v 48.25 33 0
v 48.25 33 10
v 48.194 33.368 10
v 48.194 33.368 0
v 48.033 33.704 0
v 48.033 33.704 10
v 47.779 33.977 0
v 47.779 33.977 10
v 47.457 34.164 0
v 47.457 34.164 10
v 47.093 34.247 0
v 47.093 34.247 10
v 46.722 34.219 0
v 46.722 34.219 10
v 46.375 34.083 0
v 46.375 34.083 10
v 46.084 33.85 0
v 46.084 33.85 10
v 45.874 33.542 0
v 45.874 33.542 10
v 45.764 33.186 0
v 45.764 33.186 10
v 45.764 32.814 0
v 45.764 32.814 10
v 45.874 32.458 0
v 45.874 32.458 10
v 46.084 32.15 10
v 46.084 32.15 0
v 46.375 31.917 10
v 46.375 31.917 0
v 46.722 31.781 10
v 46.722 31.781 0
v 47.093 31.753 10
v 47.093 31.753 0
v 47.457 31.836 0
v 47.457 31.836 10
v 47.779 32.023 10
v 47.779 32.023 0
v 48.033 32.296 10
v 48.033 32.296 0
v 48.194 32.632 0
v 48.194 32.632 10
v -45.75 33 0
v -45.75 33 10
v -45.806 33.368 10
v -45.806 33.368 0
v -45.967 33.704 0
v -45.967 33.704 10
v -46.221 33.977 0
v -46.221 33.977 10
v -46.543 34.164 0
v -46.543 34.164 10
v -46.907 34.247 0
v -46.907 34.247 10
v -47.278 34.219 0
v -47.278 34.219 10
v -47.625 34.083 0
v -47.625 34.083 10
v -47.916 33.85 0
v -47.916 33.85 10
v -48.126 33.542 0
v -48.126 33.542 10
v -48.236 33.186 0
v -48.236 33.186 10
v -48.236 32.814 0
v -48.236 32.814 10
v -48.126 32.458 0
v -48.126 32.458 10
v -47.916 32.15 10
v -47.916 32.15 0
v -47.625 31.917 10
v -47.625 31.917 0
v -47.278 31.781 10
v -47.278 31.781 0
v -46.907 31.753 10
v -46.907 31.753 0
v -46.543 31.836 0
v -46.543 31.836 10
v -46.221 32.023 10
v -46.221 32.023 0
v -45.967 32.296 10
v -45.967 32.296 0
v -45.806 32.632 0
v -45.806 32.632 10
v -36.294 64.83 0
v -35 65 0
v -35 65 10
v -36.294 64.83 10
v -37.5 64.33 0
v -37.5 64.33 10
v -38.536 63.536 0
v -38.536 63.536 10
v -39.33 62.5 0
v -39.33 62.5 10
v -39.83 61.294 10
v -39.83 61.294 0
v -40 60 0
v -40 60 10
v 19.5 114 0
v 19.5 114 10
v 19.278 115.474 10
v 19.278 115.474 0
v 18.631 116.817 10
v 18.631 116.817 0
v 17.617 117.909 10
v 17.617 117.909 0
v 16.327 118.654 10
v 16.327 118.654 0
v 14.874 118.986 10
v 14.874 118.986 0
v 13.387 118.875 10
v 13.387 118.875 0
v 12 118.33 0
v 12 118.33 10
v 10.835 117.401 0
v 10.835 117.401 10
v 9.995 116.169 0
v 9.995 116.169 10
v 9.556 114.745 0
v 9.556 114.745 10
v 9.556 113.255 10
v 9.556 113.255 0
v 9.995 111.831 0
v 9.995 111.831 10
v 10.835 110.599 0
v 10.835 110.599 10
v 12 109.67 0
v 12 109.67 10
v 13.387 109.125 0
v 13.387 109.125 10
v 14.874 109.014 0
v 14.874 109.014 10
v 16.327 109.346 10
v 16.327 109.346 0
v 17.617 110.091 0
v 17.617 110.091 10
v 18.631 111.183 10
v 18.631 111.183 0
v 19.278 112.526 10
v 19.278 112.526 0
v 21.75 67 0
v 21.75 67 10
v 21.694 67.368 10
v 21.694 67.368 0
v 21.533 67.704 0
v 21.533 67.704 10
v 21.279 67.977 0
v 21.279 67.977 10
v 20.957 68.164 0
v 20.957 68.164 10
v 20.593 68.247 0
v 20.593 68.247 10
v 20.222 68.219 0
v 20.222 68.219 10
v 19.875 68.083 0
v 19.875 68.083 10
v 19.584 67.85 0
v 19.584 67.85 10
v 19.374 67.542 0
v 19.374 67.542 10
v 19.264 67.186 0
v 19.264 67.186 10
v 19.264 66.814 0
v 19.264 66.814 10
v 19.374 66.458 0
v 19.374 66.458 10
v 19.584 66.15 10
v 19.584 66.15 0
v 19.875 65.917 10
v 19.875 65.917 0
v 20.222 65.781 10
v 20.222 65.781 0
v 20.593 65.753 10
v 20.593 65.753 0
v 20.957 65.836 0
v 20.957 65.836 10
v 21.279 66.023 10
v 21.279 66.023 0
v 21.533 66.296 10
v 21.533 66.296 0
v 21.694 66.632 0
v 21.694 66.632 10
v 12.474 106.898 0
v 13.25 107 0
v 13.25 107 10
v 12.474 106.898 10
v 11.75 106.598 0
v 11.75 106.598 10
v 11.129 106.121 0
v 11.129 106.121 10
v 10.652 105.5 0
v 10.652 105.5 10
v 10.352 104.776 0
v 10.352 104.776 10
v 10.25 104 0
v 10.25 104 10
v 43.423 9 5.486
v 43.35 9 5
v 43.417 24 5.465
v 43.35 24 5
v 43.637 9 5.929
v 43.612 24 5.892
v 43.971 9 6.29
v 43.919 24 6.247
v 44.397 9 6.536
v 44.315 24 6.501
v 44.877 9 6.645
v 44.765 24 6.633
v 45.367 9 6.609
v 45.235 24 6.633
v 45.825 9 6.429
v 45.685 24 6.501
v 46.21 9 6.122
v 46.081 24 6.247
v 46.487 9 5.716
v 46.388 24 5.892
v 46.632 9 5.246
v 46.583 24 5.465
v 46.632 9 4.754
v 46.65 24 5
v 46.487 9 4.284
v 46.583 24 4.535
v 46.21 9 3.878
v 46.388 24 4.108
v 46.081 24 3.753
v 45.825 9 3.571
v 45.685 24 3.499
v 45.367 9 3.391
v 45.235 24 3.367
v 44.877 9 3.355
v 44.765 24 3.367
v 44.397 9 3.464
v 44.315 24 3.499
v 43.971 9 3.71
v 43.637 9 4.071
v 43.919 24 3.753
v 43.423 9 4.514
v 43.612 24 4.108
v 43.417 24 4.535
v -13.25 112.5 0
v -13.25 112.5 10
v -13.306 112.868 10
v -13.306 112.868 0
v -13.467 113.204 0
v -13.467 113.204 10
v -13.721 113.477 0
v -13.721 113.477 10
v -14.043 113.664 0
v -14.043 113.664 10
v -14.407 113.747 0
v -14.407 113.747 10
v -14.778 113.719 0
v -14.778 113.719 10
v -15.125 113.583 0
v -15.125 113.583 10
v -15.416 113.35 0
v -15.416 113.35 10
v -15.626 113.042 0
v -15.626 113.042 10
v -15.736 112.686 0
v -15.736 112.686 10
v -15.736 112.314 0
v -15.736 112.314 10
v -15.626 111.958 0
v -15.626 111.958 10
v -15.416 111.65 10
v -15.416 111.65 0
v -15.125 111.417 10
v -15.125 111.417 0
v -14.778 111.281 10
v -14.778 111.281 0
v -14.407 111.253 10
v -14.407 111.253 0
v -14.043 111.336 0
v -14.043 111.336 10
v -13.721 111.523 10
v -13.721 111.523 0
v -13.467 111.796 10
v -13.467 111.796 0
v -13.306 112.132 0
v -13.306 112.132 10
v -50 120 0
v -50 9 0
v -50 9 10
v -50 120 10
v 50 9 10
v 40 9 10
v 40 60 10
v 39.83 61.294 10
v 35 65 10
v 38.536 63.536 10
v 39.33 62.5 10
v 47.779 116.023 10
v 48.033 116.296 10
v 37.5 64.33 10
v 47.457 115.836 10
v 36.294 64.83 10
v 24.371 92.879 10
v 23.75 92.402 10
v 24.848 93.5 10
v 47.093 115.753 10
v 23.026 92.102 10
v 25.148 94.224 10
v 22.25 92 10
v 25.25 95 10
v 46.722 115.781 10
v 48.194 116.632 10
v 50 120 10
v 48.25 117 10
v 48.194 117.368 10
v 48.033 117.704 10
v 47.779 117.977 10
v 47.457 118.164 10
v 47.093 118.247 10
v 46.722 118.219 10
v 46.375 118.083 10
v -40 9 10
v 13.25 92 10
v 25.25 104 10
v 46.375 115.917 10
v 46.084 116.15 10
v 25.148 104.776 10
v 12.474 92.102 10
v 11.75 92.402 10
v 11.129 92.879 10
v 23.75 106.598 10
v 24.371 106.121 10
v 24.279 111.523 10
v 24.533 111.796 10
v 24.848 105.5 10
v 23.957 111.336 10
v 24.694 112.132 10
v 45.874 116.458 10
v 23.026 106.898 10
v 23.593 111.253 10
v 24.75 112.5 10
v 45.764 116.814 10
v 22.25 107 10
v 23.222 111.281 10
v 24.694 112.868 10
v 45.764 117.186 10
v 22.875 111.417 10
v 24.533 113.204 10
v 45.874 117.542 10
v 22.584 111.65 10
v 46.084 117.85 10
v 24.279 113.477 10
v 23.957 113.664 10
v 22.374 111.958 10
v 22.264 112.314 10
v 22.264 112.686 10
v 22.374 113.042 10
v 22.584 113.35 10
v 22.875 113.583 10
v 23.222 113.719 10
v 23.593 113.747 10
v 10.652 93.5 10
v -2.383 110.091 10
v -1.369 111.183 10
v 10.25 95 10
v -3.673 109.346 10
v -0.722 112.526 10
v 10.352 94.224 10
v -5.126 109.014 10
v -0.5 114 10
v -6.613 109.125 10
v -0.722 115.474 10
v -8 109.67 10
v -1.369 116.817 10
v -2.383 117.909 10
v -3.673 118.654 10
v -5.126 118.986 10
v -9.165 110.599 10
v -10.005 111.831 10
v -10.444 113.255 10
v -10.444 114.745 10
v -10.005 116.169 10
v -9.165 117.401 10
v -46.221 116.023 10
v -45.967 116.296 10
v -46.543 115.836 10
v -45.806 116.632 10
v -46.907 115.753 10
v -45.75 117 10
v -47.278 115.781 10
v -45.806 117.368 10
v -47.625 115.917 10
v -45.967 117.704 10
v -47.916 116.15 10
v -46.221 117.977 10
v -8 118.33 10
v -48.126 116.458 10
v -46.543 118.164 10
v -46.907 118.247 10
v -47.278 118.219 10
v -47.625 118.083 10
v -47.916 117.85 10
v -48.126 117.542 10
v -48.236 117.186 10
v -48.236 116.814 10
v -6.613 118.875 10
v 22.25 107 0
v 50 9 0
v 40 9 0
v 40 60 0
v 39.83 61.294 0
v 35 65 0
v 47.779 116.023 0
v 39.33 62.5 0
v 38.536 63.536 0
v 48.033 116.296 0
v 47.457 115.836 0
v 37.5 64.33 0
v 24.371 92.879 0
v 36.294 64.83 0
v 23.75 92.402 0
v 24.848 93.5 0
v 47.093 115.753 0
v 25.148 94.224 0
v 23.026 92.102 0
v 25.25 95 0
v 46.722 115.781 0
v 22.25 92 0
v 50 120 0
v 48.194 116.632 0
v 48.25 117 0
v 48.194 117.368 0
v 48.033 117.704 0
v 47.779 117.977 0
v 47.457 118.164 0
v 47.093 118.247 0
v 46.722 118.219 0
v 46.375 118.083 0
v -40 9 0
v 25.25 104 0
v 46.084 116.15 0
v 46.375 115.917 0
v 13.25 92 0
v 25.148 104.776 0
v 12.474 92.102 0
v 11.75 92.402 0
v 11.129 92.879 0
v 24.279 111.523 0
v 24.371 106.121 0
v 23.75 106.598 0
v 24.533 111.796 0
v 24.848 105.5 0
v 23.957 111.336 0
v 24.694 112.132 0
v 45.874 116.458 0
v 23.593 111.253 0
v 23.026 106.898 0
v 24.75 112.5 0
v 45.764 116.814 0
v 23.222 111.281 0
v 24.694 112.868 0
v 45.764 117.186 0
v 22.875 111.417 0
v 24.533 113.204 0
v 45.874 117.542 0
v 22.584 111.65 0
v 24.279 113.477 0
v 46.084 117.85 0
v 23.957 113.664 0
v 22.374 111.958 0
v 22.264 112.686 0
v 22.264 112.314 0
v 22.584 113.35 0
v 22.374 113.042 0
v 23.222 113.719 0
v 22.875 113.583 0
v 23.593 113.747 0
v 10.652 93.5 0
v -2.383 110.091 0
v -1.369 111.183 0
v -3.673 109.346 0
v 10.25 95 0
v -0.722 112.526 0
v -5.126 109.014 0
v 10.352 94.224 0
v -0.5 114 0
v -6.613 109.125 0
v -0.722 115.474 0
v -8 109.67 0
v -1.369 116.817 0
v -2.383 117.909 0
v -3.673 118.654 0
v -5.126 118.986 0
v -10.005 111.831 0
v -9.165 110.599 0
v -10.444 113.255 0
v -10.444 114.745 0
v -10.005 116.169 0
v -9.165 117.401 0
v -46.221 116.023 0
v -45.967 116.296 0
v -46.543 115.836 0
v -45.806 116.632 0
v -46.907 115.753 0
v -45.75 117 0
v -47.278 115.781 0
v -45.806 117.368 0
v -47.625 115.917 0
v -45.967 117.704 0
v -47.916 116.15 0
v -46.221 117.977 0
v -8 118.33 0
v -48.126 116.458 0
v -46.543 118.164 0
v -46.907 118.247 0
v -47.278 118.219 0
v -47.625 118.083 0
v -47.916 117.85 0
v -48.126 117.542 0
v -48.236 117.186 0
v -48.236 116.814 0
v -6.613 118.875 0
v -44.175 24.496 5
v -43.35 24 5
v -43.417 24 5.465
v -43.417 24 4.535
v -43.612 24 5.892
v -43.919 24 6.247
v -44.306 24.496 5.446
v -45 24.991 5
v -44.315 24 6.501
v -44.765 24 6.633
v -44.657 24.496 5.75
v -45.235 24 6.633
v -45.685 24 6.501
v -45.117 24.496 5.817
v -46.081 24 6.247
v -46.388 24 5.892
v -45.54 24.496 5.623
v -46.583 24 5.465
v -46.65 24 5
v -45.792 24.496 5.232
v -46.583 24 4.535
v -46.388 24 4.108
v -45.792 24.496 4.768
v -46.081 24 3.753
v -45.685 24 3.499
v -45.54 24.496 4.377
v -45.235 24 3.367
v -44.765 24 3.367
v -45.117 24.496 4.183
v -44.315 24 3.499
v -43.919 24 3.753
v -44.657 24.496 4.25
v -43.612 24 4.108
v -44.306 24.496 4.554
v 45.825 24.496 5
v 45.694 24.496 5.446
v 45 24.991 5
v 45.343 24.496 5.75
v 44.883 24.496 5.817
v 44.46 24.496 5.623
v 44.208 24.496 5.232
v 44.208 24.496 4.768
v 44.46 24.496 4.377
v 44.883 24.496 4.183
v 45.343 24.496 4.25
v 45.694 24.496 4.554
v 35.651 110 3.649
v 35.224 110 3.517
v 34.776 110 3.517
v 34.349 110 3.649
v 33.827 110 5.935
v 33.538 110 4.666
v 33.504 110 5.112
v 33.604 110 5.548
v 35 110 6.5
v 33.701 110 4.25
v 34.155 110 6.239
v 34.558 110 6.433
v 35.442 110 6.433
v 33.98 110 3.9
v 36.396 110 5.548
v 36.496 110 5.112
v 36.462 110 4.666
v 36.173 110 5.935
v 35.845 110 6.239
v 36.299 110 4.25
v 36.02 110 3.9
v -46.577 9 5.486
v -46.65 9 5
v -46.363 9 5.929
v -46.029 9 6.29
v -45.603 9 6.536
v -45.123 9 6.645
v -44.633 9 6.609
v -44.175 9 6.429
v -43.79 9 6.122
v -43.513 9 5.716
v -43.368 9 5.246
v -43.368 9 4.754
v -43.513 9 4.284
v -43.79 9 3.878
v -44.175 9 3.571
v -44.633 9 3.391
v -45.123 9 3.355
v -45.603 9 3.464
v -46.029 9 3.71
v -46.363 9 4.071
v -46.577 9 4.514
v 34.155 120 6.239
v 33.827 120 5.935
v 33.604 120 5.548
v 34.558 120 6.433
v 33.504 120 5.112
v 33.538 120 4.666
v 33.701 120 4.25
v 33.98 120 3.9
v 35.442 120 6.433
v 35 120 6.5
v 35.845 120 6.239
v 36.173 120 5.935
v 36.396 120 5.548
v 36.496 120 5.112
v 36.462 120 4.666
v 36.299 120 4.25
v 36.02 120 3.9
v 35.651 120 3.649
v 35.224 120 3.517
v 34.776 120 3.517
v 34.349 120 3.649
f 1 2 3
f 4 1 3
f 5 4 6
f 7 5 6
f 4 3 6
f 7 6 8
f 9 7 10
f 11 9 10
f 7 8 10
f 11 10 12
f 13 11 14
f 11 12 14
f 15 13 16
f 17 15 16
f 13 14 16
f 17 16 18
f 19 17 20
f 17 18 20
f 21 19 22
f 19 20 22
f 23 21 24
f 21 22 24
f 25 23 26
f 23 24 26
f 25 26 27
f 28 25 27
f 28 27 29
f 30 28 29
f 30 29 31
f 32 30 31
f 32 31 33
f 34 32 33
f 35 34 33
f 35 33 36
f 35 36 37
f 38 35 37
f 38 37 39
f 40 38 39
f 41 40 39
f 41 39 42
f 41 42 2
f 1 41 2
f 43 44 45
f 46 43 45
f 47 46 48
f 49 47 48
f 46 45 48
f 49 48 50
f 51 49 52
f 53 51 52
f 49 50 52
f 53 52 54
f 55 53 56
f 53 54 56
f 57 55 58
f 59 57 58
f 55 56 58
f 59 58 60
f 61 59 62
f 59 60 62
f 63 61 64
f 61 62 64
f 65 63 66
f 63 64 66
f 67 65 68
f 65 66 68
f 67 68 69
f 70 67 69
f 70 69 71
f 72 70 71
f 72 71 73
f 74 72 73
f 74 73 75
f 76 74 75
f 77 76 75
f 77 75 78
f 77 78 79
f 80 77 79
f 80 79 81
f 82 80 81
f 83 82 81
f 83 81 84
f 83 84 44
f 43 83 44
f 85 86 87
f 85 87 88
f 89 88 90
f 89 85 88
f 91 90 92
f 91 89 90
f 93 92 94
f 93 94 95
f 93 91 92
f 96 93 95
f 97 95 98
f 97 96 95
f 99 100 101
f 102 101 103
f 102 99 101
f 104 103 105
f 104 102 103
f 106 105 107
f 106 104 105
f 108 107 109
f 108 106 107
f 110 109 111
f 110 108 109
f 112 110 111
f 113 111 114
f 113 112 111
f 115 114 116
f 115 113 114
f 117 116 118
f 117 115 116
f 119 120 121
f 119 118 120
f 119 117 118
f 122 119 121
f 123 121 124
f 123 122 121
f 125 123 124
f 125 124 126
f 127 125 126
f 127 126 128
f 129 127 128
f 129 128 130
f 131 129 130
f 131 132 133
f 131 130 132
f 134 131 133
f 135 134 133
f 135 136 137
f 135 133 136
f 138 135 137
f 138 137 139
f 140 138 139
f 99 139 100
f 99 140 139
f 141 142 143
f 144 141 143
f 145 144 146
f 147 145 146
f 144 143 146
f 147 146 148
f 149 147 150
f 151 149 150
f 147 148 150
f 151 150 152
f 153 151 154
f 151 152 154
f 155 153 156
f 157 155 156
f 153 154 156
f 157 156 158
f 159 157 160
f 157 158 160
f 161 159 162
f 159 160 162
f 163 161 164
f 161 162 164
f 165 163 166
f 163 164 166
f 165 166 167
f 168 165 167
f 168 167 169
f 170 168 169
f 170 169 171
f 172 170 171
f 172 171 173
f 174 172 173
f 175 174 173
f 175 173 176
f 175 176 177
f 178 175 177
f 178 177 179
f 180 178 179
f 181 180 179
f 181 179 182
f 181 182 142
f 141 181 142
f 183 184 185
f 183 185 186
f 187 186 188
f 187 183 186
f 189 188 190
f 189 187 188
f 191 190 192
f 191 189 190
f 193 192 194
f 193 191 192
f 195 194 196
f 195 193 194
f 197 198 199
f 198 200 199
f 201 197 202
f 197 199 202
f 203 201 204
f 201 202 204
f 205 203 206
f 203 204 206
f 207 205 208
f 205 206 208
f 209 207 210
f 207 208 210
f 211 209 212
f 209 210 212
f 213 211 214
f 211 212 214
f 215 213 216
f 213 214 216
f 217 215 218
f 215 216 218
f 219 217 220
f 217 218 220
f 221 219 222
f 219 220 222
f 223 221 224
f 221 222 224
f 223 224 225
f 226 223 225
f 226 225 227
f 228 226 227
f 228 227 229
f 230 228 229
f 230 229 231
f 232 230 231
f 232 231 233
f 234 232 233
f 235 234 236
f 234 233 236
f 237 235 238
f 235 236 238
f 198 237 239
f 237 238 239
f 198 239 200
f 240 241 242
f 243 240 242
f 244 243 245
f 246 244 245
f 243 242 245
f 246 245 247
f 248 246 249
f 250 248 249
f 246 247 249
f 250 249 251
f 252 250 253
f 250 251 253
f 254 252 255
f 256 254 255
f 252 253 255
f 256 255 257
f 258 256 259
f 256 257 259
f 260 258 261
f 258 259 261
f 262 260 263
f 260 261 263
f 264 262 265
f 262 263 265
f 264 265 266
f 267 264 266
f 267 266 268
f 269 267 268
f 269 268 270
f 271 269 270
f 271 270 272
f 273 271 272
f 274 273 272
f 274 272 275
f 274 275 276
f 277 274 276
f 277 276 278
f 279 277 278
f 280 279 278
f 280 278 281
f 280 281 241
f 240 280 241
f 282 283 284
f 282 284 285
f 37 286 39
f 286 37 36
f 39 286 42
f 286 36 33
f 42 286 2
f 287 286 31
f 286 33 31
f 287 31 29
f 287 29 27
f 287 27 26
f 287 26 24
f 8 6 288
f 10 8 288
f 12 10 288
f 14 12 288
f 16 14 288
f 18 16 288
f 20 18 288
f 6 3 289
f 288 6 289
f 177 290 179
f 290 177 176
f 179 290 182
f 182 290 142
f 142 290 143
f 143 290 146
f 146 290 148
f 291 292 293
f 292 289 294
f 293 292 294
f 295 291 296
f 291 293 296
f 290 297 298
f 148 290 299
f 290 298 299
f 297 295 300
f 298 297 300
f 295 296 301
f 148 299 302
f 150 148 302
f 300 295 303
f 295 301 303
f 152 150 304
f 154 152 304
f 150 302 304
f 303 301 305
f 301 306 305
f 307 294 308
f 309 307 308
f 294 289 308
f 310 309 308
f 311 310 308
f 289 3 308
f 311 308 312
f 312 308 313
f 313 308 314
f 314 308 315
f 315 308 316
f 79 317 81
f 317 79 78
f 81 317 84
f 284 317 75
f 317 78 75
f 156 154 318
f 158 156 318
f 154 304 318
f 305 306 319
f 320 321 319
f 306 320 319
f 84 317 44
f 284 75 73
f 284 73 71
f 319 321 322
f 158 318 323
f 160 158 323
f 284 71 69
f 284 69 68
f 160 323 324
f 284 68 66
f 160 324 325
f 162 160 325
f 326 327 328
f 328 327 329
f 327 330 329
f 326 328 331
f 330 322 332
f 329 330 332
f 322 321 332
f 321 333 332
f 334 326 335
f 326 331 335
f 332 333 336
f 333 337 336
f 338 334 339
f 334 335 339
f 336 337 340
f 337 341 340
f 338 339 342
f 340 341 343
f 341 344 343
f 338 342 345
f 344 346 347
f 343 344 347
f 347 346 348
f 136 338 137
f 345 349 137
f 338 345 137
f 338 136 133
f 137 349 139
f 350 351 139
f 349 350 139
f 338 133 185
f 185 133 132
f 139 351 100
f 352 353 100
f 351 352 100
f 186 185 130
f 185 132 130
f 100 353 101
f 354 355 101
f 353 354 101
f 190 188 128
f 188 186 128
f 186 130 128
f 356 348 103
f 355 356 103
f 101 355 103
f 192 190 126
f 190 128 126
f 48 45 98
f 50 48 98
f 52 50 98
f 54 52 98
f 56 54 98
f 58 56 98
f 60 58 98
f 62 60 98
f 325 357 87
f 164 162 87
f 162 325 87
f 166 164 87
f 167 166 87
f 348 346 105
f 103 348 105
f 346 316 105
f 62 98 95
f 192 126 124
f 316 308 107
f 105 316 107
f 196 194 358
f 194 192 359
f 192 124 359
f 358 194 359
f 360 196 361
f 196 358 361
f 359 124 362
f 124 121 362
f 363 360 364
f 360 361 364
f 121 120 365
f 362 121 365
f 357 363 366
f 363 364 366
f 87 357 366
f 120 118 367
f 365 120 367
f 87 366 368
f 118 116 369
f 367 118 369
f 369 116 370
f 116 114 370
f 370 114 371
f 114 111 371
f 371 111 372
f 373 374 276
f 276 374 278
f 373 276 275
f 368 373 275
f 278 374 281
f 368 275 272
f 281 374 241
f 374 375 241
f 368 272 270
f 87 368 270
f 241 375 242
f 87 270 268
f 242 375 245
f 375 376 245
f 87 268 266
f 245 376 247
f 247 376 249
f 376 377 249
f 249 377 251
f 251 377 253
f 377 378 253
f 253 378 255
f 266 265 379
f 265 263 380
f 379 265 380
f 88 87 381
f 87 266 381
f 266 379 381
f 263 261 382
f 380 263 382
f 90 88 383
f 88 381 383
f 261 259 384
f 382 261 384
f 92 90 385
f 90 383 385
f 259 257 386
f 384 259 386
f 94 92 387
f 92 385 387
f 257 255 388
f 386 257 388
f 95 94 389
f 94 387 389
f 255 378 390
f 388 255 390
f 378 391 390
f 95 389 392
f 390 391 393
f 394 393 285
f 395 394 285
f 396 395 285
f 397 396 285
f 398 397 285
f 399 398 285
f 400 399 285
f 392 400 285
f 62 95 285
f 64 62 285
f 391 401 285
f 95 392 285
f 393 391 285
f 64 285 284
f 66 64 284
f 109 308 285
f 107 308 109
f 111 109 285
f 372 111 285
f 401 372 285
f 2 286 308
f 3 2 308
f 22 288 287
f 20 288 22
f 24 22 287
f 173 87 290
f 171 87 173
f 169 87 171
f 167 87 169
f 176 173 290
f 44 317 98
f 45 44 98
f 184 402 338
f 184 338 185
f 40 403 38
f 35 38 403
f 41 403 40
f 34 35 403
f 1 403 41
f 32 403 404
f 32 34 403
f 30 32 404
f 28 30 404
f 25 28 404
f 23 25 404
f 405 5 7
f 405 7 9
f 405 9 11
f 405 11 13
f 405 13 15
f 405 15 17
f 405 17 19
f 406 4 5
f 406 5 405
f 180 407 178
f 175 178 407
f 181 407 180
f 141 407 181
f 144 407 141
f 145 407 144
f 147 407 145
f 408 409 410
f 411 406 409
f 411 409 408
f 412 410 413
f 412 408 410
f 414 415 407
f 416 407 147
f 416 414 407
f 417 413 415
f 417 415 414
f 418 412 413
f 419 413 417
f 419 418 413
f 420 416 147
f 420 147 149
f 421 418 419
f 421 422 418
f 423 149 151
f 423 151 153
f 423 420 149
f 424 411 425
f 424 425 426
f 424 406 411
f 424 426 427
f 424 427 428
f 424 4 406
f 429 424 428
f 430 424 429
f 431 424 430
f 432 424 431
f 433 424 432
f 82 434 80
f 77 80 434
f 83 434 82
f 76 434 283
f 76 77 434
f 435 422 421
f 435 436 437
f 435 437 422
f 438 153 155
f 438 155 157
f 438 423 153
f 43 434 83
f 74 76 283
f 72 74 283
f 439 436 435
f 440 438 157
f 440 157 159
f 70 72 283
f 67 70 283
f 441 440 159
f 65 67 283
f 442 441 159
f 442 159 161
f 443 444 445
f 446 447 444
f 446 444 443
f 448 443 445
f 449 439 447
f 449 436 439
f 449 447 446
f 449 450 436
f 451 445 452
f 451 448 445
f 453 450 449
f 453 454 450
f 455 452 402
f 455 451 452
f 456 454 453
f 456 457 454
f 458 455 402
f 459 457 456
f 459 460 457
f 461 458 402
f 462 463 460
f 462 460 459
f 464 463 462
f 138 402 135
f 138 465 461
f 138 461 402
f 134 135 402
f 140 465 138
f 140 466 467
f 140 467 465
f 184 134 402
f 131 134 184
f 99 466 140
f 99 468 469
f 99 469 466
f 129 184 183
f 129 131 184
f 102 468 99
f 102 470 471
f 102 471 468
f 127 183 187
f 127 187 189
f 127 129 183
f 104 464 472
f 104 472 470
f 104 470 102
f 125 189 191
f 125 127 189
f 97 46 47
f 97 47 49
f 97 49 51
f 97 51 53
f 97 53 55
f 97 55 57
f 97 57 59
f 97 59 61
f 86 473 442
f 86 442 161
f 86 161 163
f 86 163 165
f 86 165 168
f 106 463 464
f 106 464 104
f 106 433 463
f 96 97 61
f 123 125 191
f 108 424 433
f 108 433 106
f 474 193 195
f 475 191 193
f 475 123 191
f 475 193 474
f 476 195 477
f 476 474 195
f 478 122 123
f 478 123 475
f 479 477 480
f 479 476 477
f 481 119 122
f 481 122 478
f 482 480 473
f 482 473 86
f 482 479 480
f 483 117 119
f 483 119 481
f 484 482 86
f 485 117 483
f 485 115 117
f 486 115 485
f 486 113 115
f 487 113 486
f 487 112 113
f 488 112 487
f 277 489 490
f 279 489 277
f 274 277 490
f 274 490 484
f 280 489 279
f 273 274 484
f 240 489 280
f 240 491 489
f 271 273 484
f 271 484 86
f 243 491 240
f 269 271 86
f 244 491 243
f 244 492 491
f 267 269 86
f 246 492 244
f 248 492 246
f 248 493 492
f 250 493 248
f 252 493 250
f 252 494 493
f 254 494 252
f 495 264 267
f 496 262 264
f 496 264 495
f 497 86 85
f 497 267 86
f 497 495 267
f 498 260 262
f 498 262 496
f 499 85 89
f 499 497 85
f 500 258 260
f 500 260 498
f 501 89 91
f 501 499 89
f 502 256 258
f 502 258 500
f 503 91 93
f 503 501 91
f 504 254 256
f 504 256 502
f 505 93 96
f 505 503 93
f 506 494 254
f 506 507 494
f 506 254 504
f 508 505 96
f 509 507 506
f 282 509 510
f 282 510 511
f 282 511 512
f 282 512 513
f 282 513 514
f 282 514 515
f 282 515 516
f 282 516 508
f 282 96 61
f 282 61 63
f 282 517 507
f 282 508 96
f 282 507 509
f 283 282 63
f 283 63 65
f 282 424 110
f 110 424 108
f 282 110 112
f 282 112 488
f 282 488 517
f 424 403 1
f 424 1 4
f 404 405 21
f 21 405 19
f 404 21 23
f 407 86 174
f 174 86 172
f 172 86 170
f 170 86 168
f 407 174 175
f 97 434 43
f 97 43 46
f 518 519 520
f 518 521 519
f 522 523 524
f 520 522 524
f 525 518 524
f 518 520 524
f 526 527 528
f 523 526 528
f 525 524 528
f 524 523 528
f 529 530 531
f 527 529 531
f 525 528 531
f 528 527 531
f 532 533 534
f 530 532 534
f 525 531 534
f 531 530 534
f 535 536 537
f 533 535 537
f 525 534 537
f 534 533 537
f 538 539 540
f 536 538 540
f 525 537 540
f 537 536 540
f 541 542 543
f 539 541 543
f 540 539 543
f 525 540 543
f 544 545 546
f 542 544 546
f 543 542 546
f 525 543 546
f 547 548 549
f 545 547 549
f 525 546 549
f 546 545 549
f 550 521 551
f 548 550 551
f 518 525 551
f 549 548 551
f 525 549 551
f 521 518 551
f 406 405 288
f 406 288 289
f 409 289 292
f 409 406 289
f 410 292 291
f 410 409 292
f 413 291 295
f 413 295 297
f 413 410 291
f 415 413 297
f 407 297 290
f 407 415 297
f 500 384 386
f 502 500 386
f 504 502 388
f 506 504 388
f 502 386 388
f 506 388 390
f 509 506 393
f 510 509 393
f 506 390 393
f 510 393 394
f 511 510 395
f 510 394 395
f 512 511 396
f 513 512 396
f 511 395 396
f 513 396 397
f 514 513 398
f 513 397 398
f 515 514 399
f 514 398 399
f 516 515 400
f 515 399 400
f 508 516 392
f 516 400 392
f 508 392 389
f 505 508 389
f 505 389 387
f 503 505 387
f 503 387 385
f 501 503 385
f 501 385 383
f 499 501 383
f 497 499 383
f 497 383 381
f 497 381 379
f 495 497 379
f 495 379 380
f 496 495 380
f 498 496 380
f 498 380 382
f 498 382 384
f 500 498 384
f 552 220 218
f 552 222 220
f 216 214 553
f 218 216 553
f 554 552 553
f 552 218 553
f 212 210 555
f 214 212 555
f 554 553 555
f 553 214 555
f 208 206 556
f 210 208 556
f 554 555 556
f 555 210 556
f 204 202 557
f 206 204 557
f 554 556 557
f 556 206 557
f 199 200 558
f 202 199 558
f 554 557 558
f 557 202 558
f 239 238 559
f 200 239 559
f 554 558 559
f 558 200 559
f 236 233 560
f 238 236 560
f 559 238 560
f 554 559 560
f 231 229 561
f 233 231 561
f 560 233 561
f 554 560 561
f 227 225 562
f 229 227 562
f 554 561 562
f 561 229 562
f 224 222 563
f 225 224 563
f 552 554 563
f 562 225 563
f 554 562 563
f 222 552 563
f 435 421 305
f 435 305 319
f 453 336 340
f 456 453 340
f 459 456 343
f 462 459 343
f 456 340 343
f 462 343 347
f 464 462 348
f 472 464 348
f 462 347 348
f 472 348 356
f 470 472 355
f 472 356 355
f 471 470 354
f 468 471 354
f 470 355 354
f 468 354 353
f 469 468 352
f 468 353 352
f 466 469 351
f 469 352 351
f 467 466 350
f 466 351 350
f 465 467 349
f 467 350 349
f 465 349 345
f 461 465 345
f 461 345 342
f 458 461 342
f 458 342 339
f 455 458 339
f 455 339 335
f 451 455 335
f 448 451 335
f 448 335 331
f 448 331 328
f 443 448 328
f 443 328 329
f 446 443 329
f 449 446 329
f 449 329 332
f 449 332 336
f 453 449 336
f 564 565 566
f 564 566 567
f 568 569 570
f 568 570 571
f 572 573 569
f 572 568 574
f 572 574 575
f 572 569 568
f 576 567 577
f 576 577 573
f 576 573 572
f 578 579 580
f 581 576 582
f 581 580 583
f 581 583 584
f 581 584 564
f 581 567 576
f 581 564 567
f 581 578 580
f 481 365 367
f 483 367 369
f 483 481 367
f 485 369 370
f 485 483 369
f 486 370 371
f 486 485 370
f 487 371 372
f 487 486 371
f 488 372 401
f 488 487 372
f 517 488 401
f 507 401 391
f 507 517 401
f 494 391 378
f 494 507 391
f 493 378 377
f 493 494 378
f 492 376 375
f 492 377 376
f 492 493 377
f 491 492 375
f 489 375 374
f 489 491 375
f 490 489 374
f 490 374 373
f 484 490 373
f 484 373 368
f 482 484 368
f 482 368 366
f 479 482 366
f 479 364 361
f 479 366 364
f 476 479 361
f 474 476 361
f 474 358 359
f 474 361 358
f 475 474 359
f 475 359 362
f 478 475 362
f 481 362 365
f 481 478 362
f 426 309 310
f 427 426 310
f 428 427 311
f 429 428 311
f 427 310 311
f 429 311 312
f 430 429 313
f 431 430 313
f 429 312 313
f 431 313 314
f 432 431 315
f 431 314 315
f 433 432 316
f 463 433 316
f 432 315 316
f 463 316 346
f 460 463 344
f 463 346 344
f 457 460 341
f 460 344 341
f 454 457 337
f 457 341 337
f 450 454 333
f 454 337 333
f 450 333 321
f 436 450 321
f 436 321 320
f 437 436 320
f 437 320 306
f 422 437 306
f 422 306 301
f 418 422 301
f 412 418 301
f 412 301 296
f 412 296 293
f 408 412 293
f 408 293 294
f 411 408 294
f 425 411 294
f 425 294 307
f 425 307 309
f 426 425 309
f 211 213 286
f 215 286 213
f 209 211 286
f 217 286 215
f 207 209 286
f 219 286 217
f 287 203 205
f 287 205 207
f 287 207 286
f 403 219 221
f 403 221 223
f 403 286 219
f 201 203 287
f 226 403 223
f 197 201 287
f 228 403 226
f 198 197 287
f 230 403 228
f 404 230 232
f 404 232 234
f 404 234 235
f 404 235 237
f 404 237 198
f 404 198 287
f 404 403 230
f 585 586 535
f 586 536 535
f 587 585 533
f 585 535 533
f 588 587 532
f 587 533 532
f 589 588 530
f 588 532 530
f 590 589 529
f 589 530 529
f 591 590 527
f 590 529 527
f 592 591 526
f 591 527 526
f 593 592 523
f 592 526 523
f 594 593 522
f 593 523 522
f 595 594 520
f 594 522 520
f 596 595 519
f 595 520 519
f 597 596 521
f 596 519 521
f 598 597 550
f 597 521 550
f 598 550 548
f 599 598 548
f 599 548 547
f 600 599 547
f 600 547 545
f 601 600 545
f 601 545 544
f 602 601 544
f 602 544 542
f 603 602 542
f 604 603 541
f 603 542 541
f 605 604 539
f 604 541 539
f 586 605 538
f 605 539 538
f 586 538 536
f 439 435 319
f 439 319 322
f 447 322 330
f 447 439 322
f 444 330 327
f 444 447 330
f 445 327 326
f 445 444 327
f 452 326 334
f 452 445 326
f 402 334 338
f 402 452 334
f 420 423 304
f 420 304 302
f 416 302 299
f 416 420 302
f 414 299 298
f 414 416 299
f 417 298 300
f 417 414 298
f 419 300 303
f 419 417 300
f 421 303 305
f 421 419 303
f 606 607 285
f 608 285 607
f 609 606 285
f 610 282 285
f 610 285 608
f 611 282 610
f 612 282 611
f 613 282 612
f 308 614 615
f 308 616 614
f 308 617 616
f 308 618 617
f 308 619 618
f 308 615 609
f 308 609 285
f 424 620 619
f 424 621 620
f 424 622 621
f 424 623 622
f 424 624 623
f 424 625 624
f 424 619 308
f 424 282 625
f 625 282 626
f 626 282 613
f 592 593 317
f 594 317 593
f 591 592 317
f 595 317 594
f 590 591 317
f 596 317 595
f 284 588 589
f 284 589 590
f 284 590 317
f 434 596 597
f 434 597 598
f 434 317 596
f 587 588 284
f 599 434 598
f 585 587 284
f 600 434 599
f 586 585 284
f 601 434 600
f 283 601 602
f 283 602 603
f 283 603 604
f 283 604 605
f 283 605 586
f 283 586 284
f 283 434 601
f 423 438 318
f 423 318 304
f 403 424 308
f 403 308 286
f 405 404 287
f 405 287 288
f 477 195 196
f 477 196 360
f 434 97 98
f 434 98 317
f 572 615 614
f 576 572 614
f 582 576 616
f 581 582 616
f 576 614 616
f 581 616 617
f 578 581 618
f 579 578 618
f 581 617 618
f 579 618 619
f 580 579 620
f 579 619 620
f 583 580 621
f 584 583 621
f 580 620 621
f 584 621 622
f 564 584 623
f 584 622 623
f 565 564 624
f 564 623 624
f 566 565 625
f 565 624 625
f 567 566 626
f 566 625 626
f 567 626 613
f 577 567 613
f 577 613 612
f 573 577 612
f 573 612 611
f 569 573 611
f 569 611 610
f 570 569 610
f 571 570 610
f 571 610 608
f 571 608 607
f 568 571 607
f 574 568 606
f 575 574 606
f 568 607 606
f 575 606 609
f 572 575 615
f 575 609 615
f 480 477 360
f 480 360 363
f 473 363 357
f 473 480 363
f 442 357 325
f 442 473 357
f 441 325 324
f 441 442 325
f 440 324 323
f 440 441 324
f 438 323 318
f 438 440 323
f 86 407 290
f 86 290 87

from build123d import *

# Parameters (mm, degrees)
EXTRUSION1_DEPTH          = 10
TROU_TARAUD_M4X0_71_D     = 3.3
TROU_TARAUD_M4X0_71_DEPTH = 15
TROU_TARAUD_M4X0_71_TIP   = 0.991420021
ESQUISSE4_R               = 5
ENL_V_MAT_EXTRU_1_DEPTH   = 131.384048104
TROU_TARAUD_M31_D         = 2.5
ESQUISSE7_R               = 1.5
ENL_V_MAT_EXTRU_2_DEPTH   = 10


with BuildPart() as part:
    # Esquisse1 → Extrusion1 (new body)
    with BuildSketch(Plane.XY):
        with BuildLine():
            Line((-40, 9), (-50, 9))
            Line((-50, 9), (-50, 120))
            Line((-50, 120), (50, 120))
            Line((50, 120), (50, 9))
            Line((50, 9), (40, 9))
            Line((40, 9), (40, 60))
            ThreePointArc((40, 60), (38.535533906, 63.535533906), (35, 65))
            Line((35, 65), (-35, 65))
            ThreePointArc((-35, 65), (-38.535533906, 63.535533906), (-40, 60))
            Line((-40, 60), (-40, 9))
        make_face()
    extrude(amount=EXTRUSION1_DEPTH)

    # Trou taraudé M4x0.71
    with Locations(Plane.XZ.offset(-9)):
        with Locations((-45, 5), (45, 5)):
            Hole(TROU_TARAUD_M4X0_71_D / 2, depth=TROU_TARAUD_M4X0_71_DEPTH)
            with Locations((0, 0, -(TROU_TARAUD_M4X0_71_DEPTH + TROU_TARAUD_M4X0_71_TIP / 2))):  # 118° drill point
                Cone(0, TROU_TARAUD_M4X0_71_D / 2, TROU_TARAUD_M4X0_71_TIP, mode=Mode.SUBTRACT)

    # Esquisse4 → Enlèv. mat.-Extru.1 (cut, through all)
    with BuildSketch(Plane.XY):
        with Locations((14.5, 114)):
            Circle(ESQUISSE4_R)
        with Locations((-5.5, 114)):
            Circle(ESQUISSE4_R)
        with BuildLine():
            Line((22.25, 107), (13.25, 107))
            ThreePointArc((13.25, 107), (11.128679656, 106.121320344), (10.25, 104))
            Line((10.25, 104), (10.25, 95))
            ThreePointArc((10.25, 95), (11.128679656, 92.878679656), (13.25, 92))
            Line((13.25, 92), (22.25, 92))
            ThreePointArc((22.25, 92), (24.371320344, 92.878679656), (25.25, 95))
            Line((25.25, 95), (25.25, 104))
            ThreePointArc((25.25, 104), (24.371320344, 106.121320344), (22.25, 107))
        make_face()
    extrude(amount=ENL_V_MAT_EXTRU_1_DEPTH, mode=Mode.SUBTRACT)

    # Trou taraudé M31 (through all)
    with Locations(Plane(origin=(0, 0, 0), x_dir=(-1, 0, 0), z_dir=(0, 0, -1))):
        with Locations((-23.5, 112.5), (14.5, 112.5), (-20.5, 67), (-47, 117), (47, 117), (47, 33), (-47, 33)):
            Hole(TROU_TARAUD_M31_D / 2)

    # Esquisse7 → Enlèv. mat.-Extru.2 (cut)
    with BuildSketch(Plane(origin=(0, 120, 0), x_dir=(1, 0, 0), z_dir=(0, 1, 0))):
        with Locations(Location((35, -5, 0), (0, 0, 270))):
            Circle(ESQUISSE7_R)
    extrude(amount=-ENL_V_MAT_EXTRU_2_DEPTH, mode=Mode.SUBTRACT)


solid = part.part
